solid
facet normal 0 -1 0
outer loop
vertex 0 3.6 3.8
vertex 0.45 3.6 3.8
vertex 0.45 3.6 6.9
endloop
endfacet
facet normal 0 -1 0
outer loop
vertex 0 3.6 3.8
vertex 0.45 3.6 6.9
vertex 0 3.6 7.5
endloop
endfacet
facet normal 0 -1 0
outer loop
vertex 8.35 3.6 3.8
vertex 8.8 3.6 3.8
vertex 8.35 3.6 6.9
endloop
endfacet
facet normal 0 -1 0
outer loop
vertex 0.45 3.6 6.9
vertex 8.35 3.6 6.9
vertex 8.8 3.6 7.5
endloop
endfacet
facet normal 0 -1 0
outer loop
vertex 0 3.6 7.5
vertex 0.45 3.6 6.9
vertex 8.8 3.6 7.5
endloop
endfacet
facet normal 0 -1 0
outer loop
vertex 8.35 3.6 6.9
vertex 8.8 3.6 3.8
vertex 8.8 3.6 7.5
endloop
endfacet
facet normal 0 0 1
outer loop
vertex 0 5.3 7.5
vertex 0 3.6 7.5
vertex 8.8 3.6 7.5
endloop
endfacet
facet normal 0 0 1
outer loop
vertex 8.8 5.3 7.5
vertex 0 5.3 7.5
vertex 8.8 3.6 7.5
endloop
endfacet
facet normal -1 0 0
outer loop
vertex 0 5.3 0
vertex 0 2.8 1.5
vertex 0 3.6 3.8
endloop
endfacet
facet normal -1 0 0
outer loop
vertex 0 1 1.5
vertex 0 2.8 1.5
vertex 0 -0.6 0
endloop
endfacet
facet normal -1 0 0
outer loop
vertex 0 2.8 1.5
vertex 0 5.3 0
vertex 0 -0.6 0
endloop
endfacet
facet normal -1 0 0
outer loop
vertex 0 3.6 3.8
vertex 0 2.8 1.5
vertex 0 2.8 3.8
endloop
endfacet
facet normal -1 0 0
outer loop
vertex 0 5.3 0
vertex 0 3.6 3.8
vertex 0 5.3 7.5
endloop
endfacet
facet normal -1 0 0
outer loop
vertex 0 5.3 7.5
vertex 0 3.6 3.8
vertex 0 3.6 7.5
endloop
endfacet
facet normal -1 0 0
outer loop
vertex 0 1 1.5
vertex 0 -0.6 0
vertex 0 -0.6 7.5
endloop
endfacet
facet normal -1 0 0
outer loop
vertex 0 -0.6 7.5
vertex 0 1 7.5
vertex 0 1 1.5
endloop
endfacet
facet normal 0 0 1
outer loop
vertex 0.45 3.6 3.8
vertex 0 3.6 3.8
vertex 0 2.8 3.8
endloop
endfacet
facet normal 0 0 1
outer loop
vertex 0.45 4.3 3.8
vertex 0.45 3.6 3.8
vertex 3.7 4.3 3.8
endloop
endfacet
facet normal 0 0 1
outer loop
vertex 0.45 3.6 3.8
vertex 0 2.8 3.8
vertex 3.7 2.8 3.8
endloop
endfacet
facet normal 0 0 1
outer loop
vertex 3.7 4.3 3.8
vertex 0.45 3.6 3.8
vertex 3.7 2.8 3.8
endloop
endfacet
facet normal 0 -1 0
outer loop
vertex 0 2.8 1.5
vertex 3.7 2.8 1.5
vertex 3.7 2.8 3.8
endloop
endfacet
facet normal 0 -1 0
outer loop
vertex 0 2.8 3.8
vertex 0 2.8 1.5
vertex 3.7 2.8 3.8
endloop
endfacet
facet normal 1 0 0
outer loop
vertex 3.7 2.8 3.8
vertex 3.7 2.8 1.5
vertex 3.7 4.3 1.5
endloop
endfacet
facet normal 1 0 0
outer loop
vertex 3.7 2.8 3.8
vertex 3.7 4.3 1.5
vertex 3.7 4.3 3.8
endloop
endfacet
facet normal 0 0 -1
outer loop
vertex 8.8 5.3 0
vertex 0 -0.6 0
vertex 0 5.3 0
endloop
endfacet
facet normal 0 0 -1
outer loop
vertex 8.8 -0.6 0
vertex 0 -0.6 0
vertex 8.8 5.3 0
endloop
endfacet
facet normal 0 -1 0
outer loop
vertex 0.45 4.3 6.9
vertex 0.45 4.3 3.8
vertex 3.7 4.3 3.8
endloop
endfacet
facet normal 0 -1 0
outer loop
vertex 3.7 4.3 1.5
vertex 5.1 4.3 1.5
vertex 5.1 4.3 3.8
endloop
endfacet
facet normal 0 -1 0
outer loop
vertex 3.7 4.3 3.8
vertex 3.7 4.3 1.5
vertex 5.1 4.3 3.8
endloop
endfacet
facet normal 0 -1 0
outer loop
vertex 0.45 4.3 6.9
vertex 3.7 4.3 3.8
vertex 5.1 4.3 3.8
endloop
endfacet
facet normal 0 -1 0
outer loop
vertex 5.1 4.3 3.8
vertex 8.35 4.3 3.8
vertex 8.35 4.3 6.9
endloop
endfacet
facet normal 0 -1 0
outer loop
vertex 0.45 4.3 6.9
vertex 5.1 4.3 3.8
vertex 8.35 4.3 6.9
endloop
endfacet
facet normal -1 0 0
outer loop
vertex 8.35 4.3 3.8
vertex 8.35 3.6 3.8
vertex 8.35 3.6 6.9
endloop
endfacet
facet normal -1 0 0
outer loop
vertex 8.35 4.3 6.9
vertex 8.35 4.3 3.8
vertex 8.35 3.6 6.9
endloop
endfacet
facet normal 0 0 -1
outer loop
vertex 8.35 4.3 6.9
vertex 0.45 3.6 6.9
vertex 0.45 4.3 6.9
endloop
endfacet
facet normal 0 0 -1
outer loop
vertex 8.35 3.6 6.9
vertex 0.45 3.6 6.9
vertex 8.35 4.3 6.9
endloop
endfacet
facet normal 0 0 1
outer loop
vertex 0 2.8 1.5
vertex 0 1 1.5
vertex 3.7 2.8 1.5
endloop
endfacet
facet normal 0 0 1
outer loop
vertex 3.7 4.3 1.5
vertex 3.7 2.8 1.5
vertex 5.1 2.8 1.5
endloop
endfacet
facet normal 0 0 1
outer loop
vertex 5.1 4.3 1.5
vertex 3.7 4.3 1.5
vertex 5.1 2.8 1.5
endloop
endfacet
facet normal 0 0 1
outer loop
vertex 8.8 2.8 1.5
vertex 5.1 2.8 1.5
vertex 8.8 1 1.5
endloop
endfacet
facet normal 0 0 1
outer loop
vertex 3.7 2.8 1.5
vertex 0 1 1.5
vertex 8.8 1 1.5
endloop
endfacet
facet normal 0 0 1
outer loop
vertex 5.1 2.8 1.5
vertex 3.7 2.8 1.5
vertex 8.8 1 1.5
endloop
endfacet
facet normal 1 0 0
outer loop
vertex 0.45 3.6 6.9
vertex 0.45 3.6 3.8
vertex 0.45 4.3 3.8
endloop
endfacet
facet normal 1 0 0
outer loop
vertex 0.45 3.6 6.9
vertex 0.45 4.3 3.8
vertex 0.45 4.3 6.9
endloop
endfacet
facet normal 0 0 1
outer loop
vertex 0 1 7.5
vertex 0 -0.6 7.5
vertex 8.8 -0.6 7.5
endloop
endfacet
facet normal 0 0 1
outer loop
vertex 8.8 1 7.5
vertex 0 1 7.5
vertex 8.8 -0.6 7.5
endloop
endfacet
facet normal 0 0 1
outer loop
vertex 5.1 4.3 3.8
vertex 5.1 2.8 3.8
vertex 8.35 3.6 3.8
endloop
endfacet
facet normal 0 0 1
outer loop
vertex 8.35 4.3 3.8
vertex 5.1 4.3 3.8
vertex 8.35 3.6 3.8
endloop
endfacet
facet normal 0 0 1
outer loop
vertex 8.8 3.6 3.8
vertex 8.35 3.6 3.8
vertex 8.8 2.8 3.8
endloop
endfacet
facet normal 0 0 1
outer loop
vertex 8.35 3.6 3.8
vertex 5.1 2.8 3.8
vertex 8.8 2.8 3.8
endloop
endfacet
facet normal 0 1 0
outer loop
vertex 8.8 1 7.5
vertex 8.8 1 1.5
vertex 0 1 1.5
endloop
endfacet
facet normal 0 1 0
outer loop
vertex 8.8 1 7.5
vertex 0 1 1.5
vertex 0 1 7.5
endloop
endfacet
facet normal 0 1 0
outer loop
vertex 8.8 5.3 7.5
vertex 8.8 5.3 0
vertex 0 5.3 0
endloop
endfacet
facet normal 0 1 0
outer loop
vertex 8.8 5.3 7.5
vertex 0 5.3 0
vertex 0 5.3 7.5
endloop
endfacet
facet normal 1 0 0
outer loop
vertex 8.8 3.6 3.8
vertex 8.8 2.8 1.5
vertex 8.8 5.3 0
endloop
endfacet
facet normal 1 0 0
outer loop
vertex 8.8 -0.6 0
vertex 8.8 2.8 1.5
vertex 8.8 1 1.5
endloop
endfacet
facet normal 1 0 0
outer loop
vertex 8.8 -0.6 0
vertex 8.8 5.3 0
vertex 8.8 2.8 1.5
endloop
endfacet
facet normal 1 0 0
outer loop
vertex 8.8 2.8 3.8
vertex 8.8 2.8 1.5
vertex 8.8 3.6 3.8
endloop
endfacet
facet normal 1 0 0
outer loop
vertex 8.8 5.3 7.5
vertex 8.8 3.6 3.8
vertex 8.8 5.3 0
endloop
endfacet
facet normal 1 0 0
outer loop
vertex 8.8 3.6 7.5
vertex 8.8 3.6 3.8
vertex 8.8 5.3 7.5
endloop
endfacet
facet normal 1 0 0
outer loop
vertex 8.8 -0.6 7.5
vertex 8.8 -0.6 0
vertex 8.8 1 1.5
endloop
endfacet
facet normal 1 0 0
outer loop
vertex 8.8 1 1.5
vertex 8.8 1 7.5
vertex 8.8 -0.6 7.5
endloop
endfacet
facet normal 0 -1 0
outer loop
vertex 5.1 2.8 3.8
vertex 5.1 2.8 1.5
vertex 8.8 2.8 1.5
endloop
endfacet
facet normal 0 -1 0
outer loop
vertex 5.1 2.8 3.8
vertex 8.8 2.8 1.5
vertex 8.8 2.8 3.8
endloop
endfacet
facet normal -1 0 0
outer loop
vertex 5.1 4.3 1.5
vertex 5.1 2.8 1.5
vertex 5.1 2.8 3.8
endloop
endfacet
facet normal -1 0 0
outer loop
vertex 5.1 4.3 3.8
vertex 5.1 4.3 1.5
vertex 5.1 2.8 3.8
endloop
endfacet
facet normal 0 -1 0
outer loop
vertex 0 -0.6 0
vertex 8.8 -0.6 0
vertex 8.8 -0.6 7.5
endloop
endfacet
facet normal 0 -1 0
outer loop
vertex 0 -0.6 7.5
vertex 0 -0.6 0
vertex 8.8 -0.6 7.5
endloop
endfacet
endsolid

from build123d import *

# Parameters (mm, degrees)
BOX_W                = 7.5
BOX_H                = 8.8
BOX_DEPTH            = 5.9
BOX001_W             = 10
BOX001_H             = 10
BOX001_DEPTH         = 1.8
BOX002_W             = 3.1
BOX002_H             = 7.9
BOX002_DEPTH         = 3.3
BOX003_W             = 2.3
BOX003_H             = 1.4
BOX003_DEPTH         = 1.5
BOX004_W             = 10
BOX004_H             = 10
BOX004_DEPTH         = 2.6
BODY_PITCH_ANGLE     = -90
BODY_PLACEMENT_ANGLE = -90


with BuildPart() as part:
    # Box → Box (join)
    with BuildSketch(Plane.XY.offset(-0.6)):
        with Locations((3.75, 4.4)):
            Rectangle(BOX_W, BOX_H)
    extrude(amount=BOX_DEPTH)

    # Box001 → Box001 (cut)
    with BuildSketch(Plane(origin=(1.5, 0, 1), x_dir=(1, 0, 0), z_dir=(0, 0, 1))):
        with Locations((5, 5)):
            Rectangle(BOX001_W, BOX001_H)
    extrude(amount=BOX001_DEPTH, mode=Mode.SUBTRACT)

    # Box002 → Box002 (cut)
    with BuildSketch(Plane(origin=(3.8, 0.45, 1), x_dir=(1, 0, 0), z_dir=(0, 0, 1))):
        with Locations((1.55, 3.95)):
            Rectangle(BOX002_W, BOX002_H)
    extrude(amount=BOX002_DEPTH, mode=Mode.SUBTRACT)

    # Box003 → Box003 (cut)
    with BuildSketch(Plane(origin=(1.5, 3.7, 2.8), x_dir=(1, 0, 0), z_dir=(0, 0, 1))):
        with Locations((1.15, 0.7)):
            Rectangle(BOX003_W, BOX003_H)
    extrude(amount=BOX003_DEPTH, mode=Mode.SUBTRACT)

    # Box004 → Box004 (cut)
    with BuildSketch(Plane(origin=(3.8, 0, 1), x_dir=(1, 0, 0), z_dir=(0, 0, 1))):
        with Locations((5, 5)):
            Rectangle(BOX004_W, BOX004_H)
    extrude(amount=BOX004_DEPTH, mode=Mode.SUBTRACT)


with BuildPart() as part_1:
    # Body pitch: moved
    add(part.part.rotate(Axis((0, 0, 0), (0, 1, 0)), BODY_PITCH_ANGLE))


with BuildPart() as part_2:
    # Body placement: moved
    add(part_1.part.rotate(Axis((0, 0, 0), (0, 0, 1)), BODY_PLACEMENT_ANGLE))


solid = part_2.part
